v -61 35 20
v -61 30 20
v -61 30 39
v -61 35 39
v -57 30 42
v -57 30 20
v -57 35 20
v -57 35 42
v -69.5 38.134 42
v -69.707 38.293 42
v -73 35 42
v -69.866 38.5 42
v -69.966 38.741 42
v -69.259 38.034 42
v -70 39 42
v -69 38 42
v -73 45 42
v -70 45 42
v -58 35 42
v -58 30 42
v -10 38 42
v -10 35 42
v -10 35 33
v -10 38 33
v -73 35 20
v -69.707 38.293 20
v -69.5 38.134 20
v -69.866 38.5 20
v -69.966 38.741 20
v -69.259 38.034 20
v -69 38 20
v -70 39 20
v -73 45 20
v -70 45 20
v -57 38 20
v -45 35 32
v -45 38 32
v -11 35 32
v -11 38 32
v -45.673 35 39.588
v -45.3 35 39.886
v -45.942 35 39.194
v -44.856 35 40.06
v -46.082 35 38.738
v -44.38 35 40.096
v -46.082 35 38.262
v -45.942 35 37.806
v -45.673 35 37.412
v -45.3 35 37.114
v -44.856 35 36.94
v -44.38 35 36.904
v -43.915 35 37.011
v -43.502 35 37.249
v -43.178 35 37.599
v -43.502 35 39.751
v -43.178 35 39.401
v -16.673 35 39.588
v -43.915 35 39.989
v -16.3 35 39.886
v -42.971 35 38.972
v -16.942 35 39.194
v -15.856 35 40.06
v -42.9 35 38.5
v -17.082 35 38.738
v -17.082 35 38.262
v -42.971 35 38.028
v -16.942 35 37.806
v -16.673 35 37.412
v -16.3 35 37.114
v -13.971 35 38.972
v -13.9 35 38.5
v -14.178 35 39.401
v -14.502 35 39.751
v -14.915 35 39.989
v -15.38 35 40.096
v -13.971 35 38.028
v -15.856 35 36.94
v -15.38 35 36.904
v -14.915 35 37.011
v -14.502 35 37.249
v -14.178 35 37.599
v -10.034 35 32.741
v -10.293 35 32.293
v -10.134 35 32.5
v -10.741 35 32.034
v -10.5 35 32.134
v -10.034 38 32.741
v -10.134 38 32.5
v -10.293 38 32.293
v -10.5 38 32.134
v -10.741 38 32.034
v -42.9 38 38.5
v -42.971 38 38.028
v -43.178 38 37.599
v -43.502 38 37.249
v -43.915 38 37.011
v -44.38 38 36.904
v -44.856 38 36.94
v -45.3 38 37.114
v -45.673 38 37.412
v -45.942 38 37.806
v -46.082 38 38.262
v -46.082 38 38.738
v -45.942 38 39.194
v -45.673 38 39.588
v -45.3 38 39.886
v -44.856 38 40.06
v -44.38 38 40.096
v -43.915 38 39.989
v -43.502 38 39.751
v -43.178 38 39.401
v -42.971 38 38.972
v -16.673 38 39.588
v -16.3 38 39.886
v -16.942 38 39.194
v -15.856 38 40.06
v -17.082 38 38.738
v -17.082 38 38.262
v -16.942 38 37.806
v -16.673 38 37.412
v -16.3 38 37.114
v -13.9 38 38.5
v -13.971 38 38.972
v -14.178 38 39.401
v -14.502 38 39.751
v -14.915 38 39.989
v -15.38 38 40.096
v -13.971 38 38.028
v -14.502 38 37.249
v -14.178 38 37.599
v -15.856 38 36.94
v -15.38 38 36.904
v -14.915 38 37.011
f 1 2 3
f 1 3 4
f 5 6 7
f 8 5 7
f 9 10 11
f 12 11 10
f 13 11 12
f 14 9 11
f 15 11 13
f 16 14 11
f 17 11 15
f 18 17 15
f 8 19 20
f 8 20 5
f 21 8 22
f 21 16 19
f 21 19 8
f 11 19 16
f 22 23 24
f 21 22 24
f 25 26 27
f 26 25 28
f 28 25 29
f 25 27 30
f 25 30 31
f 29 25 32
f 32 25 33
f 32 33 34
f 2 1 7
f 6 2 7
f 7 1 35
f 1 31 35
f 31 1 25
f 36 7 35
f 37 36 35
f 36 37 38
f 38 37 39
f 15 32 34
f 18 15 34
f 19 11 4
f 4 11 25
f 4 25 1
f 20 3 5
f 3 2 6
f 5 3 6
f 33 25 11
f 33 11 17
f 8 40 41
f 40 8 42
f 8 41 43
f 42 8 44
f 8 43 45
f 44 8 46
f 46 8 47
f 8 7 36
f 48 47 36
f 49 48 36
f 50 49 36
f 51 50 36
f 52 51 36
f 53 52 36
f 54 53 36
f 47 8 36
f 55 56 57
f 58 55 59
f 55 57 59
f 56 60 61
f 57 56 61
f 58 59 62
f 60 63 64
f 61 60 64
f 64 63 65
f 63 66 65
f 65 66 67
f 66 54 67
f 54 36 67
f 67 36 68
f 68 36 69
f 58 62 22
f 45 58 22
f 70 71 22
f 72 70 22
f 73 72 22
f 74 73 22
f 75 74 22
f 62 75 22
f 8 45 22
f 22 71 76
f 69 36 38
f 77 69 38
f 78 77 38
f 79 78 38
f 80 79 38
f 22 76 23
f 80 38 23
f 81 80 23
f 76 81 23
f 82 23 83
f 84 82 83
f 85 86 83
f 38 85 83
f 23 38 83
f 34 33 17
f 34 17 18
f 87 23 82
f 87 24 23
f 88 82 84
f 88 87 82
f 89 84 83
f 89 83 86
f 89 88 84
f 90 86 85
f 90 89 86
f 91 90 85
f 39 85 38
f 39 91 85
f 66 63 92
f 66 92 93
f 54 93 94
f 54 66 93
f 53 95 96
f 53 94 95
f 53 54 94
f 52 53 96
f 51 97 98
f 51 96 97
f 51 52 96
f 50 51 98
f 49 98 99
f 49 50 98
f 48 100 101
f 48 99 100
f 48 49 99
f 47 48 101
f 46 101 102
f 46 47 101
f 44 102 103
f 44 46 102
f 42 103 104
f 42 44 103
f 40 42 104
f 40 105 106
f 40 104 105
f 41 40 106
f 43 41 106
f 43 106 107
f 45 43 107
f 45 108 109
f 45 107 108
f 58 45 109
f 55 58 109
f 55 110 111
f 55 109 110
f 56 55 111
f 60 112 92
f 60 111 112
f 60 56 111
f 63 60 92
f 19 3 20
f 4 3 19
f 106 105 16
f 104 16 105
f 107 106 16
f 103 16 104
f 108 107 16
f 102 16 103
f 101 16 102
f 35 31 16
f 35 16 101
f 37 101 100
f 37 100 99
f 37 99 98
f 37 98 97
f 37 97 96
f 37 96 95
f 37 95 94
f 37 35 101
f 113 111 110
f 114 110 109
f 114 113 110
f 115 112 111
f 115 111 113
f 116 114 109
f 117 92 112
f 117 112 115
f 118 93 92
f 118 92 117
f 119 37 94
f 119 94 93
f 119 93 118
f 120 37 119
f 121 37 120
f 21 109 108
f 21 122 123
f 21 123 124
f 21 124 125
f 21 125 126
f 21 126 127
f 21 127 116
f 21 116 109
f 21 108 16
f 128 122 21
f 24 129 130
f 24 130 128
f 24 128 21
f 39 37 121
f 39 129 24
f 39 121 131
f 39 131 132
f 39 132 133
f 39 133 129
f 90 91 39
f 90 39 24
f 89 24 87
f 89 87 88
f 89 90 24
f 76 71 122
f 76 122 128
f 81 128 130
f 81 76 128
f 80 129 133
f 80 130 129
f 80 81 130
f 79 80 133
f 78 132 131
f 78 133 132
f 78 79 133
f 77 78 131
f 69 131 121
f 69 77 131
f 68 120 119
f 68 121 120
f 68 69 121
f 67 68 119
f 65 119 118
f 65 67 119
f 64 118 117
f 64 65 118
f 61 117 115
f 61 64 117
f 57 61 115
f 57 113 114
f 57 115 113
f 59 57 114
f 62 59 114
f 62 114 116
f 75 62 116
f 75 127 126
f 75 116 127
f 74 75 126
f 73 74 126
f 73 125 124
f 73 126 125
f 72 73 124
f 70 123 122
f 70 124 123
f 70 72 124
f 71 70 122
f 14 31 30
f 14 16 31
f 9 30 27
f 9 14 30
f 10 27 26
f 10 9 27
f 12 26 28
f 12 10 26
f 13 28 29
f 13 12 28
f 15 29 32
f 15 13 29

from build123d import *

# Parameters (mm, degrees)
CYLINDER033_R          = 1.6
CYLINDER033_DEPTH      = 10
CYLINDER033_ROLL_ANGLE = -90
CYLINDER032_R          = 1.6
CYLINDER032_DEPTH      = 10
CYLINDER032_ROLL_ANGLE = -90
BOX029_W               = 3
BOX029_H               = 10
BOX029_DEPTH           = 22
BOX031_W               = 4
BOX031_H               = 7
BOX031_DEPTH           = 22
BOX030_W               = 26
BOX030_H               = 3
BOX030_DEPTH           = 21
CHAMFER006_SIZE        = 12
BOX028_W               = 61
BOX028_H               = 3
BOX028_DEPTH           = 10
CHAMFER007_SIZE        = 3
FILLET026_R            = 1


with BuildPart() as cylinder033:
    # Cylinder033 → Cylinder033 (new body)
    with BuildSketch(Plane.XY):
        Circle(CYLINDER033_R)
    extrude(amount=CYLINDER033_DEPTH)


with BuildPart() as cylinder033_1:
    # Cylinder033 roll: moved
    add(cylinder033.part.rotate(Axis((0, 0, 0), (1, 0, 0)), CYLINDER033_ROLL_ANGLE))


with BuildPart() as cylinder033_2:
    # Cylinder033 placement: moved
    add(cylinder033_1.part.moved(Location((-15.5, 30, 38.5))))


with BuildPart() as fusion029:
    # Cylinder032 → Cylinder032 (new body)
    with BuildSketch(Plane.XY):
        Circle(CYLINDER032_R)
    extrude(amount=CYLINDER032_DEPTH)


with BuildPart() as fusion029_1:
    # Cylinder032 roll: moved
    add(fusion029.part.rotate(Axis((0, 0, 0), (1, 0, 0)), CYLINDER032_ROLL_ANGLE))


with BuildPart() as fusion029_2:
    # Cylinder032 placement: moved
    add(fusion029_1.part.moved(Location((-44.5, 30, 38.5))))

    # Fusion029: union Cylinder033
    add(cylinder033_2.part)


with BuildPart() as cube029:
    # Box029 → Box029 (new body)
    with BuildSketch(Plane(origin=(-73, 35, 20), x_dir=(1, 0, 0), z_dir=(0, 0, 1))):
        with Locations((1.5, 5)):
            Rectangle(BOX029_W, BOX029_H)
    extrude(amount=BOX029_DEPTH)


with BuildPart() as cube031:
    # Box031 → Box031 (new body)
    with BuildSketch(Plane(origin=(-61, 30, 20), x_dir=(1, 0, 0), z_dir=(0, 0, 1))):
        with Locations((2, 3.5)):
            Rectangle(BOX031_W, BOX031_H)
    extrude(amount=BOX031_DEPTH)


with BuildPart() as chamfer006:
    # Box030 → Box030 (new body)
    with BuildSketch(Plane(origin=(-71, 35, 20), x_dir=(1, 0, 0), z_dir=(0, 0, 1))):
        with Locations((13, 1.5)):
            Rectangle(BOX030_W, BOX030_H)
    extrude(amount=BOX030_DEPTH)

    # Chamfer006
    chamfer006_edges = [chamfer006.edges().sort_by_distance(p)[0] for p in [
        (-45, 36.5, 20),
    ]]
    chamfer(chamfer006_edges, length=CHAMFER006_SIZE)


with BuildPart() as fillet026:
    # Box028 → Box028 (new body)
    with BuildSketch(Plane(origin=(-71, 35, 32), x_dir=(1, 0, 0), z_dir=(0, 0, 1))):
        with Locations((30.5, 1.5)):
            Rectangle(BOX028_W, BOX028_H)
    extrude(amount=BOX028_DEPTH)

    # Fusion026: union Chamfer006
    add(chamfer006.part)

    # Fusion027: union Cube031
    add(cube031.part)

    # Fusion028: union Cube029
    add(cube029.part)

    # Chamfer007
    chamfer007_edges = [fillet026.edges().sort_by_distance(p)[0] for p in [
        (-61, 32.5, 42),
    ]]
    chamfer(chamfer007_edges, length=CHAMFER007_SIZE)

    # Cut037: cut Fusion029
    add(fusion029_2.part, mode=Mode.SUBTRACT)

    # Fillet026
    fillet026_edges = [fillet026.edges().sort_by_distance(p)[0] for p in [
        (-10, 36.5, 32),
        (-70, 38, 31),
    ]]
    fillet(fillet026_edges, radius=FILLET026_R)


solid = fillet026.part
